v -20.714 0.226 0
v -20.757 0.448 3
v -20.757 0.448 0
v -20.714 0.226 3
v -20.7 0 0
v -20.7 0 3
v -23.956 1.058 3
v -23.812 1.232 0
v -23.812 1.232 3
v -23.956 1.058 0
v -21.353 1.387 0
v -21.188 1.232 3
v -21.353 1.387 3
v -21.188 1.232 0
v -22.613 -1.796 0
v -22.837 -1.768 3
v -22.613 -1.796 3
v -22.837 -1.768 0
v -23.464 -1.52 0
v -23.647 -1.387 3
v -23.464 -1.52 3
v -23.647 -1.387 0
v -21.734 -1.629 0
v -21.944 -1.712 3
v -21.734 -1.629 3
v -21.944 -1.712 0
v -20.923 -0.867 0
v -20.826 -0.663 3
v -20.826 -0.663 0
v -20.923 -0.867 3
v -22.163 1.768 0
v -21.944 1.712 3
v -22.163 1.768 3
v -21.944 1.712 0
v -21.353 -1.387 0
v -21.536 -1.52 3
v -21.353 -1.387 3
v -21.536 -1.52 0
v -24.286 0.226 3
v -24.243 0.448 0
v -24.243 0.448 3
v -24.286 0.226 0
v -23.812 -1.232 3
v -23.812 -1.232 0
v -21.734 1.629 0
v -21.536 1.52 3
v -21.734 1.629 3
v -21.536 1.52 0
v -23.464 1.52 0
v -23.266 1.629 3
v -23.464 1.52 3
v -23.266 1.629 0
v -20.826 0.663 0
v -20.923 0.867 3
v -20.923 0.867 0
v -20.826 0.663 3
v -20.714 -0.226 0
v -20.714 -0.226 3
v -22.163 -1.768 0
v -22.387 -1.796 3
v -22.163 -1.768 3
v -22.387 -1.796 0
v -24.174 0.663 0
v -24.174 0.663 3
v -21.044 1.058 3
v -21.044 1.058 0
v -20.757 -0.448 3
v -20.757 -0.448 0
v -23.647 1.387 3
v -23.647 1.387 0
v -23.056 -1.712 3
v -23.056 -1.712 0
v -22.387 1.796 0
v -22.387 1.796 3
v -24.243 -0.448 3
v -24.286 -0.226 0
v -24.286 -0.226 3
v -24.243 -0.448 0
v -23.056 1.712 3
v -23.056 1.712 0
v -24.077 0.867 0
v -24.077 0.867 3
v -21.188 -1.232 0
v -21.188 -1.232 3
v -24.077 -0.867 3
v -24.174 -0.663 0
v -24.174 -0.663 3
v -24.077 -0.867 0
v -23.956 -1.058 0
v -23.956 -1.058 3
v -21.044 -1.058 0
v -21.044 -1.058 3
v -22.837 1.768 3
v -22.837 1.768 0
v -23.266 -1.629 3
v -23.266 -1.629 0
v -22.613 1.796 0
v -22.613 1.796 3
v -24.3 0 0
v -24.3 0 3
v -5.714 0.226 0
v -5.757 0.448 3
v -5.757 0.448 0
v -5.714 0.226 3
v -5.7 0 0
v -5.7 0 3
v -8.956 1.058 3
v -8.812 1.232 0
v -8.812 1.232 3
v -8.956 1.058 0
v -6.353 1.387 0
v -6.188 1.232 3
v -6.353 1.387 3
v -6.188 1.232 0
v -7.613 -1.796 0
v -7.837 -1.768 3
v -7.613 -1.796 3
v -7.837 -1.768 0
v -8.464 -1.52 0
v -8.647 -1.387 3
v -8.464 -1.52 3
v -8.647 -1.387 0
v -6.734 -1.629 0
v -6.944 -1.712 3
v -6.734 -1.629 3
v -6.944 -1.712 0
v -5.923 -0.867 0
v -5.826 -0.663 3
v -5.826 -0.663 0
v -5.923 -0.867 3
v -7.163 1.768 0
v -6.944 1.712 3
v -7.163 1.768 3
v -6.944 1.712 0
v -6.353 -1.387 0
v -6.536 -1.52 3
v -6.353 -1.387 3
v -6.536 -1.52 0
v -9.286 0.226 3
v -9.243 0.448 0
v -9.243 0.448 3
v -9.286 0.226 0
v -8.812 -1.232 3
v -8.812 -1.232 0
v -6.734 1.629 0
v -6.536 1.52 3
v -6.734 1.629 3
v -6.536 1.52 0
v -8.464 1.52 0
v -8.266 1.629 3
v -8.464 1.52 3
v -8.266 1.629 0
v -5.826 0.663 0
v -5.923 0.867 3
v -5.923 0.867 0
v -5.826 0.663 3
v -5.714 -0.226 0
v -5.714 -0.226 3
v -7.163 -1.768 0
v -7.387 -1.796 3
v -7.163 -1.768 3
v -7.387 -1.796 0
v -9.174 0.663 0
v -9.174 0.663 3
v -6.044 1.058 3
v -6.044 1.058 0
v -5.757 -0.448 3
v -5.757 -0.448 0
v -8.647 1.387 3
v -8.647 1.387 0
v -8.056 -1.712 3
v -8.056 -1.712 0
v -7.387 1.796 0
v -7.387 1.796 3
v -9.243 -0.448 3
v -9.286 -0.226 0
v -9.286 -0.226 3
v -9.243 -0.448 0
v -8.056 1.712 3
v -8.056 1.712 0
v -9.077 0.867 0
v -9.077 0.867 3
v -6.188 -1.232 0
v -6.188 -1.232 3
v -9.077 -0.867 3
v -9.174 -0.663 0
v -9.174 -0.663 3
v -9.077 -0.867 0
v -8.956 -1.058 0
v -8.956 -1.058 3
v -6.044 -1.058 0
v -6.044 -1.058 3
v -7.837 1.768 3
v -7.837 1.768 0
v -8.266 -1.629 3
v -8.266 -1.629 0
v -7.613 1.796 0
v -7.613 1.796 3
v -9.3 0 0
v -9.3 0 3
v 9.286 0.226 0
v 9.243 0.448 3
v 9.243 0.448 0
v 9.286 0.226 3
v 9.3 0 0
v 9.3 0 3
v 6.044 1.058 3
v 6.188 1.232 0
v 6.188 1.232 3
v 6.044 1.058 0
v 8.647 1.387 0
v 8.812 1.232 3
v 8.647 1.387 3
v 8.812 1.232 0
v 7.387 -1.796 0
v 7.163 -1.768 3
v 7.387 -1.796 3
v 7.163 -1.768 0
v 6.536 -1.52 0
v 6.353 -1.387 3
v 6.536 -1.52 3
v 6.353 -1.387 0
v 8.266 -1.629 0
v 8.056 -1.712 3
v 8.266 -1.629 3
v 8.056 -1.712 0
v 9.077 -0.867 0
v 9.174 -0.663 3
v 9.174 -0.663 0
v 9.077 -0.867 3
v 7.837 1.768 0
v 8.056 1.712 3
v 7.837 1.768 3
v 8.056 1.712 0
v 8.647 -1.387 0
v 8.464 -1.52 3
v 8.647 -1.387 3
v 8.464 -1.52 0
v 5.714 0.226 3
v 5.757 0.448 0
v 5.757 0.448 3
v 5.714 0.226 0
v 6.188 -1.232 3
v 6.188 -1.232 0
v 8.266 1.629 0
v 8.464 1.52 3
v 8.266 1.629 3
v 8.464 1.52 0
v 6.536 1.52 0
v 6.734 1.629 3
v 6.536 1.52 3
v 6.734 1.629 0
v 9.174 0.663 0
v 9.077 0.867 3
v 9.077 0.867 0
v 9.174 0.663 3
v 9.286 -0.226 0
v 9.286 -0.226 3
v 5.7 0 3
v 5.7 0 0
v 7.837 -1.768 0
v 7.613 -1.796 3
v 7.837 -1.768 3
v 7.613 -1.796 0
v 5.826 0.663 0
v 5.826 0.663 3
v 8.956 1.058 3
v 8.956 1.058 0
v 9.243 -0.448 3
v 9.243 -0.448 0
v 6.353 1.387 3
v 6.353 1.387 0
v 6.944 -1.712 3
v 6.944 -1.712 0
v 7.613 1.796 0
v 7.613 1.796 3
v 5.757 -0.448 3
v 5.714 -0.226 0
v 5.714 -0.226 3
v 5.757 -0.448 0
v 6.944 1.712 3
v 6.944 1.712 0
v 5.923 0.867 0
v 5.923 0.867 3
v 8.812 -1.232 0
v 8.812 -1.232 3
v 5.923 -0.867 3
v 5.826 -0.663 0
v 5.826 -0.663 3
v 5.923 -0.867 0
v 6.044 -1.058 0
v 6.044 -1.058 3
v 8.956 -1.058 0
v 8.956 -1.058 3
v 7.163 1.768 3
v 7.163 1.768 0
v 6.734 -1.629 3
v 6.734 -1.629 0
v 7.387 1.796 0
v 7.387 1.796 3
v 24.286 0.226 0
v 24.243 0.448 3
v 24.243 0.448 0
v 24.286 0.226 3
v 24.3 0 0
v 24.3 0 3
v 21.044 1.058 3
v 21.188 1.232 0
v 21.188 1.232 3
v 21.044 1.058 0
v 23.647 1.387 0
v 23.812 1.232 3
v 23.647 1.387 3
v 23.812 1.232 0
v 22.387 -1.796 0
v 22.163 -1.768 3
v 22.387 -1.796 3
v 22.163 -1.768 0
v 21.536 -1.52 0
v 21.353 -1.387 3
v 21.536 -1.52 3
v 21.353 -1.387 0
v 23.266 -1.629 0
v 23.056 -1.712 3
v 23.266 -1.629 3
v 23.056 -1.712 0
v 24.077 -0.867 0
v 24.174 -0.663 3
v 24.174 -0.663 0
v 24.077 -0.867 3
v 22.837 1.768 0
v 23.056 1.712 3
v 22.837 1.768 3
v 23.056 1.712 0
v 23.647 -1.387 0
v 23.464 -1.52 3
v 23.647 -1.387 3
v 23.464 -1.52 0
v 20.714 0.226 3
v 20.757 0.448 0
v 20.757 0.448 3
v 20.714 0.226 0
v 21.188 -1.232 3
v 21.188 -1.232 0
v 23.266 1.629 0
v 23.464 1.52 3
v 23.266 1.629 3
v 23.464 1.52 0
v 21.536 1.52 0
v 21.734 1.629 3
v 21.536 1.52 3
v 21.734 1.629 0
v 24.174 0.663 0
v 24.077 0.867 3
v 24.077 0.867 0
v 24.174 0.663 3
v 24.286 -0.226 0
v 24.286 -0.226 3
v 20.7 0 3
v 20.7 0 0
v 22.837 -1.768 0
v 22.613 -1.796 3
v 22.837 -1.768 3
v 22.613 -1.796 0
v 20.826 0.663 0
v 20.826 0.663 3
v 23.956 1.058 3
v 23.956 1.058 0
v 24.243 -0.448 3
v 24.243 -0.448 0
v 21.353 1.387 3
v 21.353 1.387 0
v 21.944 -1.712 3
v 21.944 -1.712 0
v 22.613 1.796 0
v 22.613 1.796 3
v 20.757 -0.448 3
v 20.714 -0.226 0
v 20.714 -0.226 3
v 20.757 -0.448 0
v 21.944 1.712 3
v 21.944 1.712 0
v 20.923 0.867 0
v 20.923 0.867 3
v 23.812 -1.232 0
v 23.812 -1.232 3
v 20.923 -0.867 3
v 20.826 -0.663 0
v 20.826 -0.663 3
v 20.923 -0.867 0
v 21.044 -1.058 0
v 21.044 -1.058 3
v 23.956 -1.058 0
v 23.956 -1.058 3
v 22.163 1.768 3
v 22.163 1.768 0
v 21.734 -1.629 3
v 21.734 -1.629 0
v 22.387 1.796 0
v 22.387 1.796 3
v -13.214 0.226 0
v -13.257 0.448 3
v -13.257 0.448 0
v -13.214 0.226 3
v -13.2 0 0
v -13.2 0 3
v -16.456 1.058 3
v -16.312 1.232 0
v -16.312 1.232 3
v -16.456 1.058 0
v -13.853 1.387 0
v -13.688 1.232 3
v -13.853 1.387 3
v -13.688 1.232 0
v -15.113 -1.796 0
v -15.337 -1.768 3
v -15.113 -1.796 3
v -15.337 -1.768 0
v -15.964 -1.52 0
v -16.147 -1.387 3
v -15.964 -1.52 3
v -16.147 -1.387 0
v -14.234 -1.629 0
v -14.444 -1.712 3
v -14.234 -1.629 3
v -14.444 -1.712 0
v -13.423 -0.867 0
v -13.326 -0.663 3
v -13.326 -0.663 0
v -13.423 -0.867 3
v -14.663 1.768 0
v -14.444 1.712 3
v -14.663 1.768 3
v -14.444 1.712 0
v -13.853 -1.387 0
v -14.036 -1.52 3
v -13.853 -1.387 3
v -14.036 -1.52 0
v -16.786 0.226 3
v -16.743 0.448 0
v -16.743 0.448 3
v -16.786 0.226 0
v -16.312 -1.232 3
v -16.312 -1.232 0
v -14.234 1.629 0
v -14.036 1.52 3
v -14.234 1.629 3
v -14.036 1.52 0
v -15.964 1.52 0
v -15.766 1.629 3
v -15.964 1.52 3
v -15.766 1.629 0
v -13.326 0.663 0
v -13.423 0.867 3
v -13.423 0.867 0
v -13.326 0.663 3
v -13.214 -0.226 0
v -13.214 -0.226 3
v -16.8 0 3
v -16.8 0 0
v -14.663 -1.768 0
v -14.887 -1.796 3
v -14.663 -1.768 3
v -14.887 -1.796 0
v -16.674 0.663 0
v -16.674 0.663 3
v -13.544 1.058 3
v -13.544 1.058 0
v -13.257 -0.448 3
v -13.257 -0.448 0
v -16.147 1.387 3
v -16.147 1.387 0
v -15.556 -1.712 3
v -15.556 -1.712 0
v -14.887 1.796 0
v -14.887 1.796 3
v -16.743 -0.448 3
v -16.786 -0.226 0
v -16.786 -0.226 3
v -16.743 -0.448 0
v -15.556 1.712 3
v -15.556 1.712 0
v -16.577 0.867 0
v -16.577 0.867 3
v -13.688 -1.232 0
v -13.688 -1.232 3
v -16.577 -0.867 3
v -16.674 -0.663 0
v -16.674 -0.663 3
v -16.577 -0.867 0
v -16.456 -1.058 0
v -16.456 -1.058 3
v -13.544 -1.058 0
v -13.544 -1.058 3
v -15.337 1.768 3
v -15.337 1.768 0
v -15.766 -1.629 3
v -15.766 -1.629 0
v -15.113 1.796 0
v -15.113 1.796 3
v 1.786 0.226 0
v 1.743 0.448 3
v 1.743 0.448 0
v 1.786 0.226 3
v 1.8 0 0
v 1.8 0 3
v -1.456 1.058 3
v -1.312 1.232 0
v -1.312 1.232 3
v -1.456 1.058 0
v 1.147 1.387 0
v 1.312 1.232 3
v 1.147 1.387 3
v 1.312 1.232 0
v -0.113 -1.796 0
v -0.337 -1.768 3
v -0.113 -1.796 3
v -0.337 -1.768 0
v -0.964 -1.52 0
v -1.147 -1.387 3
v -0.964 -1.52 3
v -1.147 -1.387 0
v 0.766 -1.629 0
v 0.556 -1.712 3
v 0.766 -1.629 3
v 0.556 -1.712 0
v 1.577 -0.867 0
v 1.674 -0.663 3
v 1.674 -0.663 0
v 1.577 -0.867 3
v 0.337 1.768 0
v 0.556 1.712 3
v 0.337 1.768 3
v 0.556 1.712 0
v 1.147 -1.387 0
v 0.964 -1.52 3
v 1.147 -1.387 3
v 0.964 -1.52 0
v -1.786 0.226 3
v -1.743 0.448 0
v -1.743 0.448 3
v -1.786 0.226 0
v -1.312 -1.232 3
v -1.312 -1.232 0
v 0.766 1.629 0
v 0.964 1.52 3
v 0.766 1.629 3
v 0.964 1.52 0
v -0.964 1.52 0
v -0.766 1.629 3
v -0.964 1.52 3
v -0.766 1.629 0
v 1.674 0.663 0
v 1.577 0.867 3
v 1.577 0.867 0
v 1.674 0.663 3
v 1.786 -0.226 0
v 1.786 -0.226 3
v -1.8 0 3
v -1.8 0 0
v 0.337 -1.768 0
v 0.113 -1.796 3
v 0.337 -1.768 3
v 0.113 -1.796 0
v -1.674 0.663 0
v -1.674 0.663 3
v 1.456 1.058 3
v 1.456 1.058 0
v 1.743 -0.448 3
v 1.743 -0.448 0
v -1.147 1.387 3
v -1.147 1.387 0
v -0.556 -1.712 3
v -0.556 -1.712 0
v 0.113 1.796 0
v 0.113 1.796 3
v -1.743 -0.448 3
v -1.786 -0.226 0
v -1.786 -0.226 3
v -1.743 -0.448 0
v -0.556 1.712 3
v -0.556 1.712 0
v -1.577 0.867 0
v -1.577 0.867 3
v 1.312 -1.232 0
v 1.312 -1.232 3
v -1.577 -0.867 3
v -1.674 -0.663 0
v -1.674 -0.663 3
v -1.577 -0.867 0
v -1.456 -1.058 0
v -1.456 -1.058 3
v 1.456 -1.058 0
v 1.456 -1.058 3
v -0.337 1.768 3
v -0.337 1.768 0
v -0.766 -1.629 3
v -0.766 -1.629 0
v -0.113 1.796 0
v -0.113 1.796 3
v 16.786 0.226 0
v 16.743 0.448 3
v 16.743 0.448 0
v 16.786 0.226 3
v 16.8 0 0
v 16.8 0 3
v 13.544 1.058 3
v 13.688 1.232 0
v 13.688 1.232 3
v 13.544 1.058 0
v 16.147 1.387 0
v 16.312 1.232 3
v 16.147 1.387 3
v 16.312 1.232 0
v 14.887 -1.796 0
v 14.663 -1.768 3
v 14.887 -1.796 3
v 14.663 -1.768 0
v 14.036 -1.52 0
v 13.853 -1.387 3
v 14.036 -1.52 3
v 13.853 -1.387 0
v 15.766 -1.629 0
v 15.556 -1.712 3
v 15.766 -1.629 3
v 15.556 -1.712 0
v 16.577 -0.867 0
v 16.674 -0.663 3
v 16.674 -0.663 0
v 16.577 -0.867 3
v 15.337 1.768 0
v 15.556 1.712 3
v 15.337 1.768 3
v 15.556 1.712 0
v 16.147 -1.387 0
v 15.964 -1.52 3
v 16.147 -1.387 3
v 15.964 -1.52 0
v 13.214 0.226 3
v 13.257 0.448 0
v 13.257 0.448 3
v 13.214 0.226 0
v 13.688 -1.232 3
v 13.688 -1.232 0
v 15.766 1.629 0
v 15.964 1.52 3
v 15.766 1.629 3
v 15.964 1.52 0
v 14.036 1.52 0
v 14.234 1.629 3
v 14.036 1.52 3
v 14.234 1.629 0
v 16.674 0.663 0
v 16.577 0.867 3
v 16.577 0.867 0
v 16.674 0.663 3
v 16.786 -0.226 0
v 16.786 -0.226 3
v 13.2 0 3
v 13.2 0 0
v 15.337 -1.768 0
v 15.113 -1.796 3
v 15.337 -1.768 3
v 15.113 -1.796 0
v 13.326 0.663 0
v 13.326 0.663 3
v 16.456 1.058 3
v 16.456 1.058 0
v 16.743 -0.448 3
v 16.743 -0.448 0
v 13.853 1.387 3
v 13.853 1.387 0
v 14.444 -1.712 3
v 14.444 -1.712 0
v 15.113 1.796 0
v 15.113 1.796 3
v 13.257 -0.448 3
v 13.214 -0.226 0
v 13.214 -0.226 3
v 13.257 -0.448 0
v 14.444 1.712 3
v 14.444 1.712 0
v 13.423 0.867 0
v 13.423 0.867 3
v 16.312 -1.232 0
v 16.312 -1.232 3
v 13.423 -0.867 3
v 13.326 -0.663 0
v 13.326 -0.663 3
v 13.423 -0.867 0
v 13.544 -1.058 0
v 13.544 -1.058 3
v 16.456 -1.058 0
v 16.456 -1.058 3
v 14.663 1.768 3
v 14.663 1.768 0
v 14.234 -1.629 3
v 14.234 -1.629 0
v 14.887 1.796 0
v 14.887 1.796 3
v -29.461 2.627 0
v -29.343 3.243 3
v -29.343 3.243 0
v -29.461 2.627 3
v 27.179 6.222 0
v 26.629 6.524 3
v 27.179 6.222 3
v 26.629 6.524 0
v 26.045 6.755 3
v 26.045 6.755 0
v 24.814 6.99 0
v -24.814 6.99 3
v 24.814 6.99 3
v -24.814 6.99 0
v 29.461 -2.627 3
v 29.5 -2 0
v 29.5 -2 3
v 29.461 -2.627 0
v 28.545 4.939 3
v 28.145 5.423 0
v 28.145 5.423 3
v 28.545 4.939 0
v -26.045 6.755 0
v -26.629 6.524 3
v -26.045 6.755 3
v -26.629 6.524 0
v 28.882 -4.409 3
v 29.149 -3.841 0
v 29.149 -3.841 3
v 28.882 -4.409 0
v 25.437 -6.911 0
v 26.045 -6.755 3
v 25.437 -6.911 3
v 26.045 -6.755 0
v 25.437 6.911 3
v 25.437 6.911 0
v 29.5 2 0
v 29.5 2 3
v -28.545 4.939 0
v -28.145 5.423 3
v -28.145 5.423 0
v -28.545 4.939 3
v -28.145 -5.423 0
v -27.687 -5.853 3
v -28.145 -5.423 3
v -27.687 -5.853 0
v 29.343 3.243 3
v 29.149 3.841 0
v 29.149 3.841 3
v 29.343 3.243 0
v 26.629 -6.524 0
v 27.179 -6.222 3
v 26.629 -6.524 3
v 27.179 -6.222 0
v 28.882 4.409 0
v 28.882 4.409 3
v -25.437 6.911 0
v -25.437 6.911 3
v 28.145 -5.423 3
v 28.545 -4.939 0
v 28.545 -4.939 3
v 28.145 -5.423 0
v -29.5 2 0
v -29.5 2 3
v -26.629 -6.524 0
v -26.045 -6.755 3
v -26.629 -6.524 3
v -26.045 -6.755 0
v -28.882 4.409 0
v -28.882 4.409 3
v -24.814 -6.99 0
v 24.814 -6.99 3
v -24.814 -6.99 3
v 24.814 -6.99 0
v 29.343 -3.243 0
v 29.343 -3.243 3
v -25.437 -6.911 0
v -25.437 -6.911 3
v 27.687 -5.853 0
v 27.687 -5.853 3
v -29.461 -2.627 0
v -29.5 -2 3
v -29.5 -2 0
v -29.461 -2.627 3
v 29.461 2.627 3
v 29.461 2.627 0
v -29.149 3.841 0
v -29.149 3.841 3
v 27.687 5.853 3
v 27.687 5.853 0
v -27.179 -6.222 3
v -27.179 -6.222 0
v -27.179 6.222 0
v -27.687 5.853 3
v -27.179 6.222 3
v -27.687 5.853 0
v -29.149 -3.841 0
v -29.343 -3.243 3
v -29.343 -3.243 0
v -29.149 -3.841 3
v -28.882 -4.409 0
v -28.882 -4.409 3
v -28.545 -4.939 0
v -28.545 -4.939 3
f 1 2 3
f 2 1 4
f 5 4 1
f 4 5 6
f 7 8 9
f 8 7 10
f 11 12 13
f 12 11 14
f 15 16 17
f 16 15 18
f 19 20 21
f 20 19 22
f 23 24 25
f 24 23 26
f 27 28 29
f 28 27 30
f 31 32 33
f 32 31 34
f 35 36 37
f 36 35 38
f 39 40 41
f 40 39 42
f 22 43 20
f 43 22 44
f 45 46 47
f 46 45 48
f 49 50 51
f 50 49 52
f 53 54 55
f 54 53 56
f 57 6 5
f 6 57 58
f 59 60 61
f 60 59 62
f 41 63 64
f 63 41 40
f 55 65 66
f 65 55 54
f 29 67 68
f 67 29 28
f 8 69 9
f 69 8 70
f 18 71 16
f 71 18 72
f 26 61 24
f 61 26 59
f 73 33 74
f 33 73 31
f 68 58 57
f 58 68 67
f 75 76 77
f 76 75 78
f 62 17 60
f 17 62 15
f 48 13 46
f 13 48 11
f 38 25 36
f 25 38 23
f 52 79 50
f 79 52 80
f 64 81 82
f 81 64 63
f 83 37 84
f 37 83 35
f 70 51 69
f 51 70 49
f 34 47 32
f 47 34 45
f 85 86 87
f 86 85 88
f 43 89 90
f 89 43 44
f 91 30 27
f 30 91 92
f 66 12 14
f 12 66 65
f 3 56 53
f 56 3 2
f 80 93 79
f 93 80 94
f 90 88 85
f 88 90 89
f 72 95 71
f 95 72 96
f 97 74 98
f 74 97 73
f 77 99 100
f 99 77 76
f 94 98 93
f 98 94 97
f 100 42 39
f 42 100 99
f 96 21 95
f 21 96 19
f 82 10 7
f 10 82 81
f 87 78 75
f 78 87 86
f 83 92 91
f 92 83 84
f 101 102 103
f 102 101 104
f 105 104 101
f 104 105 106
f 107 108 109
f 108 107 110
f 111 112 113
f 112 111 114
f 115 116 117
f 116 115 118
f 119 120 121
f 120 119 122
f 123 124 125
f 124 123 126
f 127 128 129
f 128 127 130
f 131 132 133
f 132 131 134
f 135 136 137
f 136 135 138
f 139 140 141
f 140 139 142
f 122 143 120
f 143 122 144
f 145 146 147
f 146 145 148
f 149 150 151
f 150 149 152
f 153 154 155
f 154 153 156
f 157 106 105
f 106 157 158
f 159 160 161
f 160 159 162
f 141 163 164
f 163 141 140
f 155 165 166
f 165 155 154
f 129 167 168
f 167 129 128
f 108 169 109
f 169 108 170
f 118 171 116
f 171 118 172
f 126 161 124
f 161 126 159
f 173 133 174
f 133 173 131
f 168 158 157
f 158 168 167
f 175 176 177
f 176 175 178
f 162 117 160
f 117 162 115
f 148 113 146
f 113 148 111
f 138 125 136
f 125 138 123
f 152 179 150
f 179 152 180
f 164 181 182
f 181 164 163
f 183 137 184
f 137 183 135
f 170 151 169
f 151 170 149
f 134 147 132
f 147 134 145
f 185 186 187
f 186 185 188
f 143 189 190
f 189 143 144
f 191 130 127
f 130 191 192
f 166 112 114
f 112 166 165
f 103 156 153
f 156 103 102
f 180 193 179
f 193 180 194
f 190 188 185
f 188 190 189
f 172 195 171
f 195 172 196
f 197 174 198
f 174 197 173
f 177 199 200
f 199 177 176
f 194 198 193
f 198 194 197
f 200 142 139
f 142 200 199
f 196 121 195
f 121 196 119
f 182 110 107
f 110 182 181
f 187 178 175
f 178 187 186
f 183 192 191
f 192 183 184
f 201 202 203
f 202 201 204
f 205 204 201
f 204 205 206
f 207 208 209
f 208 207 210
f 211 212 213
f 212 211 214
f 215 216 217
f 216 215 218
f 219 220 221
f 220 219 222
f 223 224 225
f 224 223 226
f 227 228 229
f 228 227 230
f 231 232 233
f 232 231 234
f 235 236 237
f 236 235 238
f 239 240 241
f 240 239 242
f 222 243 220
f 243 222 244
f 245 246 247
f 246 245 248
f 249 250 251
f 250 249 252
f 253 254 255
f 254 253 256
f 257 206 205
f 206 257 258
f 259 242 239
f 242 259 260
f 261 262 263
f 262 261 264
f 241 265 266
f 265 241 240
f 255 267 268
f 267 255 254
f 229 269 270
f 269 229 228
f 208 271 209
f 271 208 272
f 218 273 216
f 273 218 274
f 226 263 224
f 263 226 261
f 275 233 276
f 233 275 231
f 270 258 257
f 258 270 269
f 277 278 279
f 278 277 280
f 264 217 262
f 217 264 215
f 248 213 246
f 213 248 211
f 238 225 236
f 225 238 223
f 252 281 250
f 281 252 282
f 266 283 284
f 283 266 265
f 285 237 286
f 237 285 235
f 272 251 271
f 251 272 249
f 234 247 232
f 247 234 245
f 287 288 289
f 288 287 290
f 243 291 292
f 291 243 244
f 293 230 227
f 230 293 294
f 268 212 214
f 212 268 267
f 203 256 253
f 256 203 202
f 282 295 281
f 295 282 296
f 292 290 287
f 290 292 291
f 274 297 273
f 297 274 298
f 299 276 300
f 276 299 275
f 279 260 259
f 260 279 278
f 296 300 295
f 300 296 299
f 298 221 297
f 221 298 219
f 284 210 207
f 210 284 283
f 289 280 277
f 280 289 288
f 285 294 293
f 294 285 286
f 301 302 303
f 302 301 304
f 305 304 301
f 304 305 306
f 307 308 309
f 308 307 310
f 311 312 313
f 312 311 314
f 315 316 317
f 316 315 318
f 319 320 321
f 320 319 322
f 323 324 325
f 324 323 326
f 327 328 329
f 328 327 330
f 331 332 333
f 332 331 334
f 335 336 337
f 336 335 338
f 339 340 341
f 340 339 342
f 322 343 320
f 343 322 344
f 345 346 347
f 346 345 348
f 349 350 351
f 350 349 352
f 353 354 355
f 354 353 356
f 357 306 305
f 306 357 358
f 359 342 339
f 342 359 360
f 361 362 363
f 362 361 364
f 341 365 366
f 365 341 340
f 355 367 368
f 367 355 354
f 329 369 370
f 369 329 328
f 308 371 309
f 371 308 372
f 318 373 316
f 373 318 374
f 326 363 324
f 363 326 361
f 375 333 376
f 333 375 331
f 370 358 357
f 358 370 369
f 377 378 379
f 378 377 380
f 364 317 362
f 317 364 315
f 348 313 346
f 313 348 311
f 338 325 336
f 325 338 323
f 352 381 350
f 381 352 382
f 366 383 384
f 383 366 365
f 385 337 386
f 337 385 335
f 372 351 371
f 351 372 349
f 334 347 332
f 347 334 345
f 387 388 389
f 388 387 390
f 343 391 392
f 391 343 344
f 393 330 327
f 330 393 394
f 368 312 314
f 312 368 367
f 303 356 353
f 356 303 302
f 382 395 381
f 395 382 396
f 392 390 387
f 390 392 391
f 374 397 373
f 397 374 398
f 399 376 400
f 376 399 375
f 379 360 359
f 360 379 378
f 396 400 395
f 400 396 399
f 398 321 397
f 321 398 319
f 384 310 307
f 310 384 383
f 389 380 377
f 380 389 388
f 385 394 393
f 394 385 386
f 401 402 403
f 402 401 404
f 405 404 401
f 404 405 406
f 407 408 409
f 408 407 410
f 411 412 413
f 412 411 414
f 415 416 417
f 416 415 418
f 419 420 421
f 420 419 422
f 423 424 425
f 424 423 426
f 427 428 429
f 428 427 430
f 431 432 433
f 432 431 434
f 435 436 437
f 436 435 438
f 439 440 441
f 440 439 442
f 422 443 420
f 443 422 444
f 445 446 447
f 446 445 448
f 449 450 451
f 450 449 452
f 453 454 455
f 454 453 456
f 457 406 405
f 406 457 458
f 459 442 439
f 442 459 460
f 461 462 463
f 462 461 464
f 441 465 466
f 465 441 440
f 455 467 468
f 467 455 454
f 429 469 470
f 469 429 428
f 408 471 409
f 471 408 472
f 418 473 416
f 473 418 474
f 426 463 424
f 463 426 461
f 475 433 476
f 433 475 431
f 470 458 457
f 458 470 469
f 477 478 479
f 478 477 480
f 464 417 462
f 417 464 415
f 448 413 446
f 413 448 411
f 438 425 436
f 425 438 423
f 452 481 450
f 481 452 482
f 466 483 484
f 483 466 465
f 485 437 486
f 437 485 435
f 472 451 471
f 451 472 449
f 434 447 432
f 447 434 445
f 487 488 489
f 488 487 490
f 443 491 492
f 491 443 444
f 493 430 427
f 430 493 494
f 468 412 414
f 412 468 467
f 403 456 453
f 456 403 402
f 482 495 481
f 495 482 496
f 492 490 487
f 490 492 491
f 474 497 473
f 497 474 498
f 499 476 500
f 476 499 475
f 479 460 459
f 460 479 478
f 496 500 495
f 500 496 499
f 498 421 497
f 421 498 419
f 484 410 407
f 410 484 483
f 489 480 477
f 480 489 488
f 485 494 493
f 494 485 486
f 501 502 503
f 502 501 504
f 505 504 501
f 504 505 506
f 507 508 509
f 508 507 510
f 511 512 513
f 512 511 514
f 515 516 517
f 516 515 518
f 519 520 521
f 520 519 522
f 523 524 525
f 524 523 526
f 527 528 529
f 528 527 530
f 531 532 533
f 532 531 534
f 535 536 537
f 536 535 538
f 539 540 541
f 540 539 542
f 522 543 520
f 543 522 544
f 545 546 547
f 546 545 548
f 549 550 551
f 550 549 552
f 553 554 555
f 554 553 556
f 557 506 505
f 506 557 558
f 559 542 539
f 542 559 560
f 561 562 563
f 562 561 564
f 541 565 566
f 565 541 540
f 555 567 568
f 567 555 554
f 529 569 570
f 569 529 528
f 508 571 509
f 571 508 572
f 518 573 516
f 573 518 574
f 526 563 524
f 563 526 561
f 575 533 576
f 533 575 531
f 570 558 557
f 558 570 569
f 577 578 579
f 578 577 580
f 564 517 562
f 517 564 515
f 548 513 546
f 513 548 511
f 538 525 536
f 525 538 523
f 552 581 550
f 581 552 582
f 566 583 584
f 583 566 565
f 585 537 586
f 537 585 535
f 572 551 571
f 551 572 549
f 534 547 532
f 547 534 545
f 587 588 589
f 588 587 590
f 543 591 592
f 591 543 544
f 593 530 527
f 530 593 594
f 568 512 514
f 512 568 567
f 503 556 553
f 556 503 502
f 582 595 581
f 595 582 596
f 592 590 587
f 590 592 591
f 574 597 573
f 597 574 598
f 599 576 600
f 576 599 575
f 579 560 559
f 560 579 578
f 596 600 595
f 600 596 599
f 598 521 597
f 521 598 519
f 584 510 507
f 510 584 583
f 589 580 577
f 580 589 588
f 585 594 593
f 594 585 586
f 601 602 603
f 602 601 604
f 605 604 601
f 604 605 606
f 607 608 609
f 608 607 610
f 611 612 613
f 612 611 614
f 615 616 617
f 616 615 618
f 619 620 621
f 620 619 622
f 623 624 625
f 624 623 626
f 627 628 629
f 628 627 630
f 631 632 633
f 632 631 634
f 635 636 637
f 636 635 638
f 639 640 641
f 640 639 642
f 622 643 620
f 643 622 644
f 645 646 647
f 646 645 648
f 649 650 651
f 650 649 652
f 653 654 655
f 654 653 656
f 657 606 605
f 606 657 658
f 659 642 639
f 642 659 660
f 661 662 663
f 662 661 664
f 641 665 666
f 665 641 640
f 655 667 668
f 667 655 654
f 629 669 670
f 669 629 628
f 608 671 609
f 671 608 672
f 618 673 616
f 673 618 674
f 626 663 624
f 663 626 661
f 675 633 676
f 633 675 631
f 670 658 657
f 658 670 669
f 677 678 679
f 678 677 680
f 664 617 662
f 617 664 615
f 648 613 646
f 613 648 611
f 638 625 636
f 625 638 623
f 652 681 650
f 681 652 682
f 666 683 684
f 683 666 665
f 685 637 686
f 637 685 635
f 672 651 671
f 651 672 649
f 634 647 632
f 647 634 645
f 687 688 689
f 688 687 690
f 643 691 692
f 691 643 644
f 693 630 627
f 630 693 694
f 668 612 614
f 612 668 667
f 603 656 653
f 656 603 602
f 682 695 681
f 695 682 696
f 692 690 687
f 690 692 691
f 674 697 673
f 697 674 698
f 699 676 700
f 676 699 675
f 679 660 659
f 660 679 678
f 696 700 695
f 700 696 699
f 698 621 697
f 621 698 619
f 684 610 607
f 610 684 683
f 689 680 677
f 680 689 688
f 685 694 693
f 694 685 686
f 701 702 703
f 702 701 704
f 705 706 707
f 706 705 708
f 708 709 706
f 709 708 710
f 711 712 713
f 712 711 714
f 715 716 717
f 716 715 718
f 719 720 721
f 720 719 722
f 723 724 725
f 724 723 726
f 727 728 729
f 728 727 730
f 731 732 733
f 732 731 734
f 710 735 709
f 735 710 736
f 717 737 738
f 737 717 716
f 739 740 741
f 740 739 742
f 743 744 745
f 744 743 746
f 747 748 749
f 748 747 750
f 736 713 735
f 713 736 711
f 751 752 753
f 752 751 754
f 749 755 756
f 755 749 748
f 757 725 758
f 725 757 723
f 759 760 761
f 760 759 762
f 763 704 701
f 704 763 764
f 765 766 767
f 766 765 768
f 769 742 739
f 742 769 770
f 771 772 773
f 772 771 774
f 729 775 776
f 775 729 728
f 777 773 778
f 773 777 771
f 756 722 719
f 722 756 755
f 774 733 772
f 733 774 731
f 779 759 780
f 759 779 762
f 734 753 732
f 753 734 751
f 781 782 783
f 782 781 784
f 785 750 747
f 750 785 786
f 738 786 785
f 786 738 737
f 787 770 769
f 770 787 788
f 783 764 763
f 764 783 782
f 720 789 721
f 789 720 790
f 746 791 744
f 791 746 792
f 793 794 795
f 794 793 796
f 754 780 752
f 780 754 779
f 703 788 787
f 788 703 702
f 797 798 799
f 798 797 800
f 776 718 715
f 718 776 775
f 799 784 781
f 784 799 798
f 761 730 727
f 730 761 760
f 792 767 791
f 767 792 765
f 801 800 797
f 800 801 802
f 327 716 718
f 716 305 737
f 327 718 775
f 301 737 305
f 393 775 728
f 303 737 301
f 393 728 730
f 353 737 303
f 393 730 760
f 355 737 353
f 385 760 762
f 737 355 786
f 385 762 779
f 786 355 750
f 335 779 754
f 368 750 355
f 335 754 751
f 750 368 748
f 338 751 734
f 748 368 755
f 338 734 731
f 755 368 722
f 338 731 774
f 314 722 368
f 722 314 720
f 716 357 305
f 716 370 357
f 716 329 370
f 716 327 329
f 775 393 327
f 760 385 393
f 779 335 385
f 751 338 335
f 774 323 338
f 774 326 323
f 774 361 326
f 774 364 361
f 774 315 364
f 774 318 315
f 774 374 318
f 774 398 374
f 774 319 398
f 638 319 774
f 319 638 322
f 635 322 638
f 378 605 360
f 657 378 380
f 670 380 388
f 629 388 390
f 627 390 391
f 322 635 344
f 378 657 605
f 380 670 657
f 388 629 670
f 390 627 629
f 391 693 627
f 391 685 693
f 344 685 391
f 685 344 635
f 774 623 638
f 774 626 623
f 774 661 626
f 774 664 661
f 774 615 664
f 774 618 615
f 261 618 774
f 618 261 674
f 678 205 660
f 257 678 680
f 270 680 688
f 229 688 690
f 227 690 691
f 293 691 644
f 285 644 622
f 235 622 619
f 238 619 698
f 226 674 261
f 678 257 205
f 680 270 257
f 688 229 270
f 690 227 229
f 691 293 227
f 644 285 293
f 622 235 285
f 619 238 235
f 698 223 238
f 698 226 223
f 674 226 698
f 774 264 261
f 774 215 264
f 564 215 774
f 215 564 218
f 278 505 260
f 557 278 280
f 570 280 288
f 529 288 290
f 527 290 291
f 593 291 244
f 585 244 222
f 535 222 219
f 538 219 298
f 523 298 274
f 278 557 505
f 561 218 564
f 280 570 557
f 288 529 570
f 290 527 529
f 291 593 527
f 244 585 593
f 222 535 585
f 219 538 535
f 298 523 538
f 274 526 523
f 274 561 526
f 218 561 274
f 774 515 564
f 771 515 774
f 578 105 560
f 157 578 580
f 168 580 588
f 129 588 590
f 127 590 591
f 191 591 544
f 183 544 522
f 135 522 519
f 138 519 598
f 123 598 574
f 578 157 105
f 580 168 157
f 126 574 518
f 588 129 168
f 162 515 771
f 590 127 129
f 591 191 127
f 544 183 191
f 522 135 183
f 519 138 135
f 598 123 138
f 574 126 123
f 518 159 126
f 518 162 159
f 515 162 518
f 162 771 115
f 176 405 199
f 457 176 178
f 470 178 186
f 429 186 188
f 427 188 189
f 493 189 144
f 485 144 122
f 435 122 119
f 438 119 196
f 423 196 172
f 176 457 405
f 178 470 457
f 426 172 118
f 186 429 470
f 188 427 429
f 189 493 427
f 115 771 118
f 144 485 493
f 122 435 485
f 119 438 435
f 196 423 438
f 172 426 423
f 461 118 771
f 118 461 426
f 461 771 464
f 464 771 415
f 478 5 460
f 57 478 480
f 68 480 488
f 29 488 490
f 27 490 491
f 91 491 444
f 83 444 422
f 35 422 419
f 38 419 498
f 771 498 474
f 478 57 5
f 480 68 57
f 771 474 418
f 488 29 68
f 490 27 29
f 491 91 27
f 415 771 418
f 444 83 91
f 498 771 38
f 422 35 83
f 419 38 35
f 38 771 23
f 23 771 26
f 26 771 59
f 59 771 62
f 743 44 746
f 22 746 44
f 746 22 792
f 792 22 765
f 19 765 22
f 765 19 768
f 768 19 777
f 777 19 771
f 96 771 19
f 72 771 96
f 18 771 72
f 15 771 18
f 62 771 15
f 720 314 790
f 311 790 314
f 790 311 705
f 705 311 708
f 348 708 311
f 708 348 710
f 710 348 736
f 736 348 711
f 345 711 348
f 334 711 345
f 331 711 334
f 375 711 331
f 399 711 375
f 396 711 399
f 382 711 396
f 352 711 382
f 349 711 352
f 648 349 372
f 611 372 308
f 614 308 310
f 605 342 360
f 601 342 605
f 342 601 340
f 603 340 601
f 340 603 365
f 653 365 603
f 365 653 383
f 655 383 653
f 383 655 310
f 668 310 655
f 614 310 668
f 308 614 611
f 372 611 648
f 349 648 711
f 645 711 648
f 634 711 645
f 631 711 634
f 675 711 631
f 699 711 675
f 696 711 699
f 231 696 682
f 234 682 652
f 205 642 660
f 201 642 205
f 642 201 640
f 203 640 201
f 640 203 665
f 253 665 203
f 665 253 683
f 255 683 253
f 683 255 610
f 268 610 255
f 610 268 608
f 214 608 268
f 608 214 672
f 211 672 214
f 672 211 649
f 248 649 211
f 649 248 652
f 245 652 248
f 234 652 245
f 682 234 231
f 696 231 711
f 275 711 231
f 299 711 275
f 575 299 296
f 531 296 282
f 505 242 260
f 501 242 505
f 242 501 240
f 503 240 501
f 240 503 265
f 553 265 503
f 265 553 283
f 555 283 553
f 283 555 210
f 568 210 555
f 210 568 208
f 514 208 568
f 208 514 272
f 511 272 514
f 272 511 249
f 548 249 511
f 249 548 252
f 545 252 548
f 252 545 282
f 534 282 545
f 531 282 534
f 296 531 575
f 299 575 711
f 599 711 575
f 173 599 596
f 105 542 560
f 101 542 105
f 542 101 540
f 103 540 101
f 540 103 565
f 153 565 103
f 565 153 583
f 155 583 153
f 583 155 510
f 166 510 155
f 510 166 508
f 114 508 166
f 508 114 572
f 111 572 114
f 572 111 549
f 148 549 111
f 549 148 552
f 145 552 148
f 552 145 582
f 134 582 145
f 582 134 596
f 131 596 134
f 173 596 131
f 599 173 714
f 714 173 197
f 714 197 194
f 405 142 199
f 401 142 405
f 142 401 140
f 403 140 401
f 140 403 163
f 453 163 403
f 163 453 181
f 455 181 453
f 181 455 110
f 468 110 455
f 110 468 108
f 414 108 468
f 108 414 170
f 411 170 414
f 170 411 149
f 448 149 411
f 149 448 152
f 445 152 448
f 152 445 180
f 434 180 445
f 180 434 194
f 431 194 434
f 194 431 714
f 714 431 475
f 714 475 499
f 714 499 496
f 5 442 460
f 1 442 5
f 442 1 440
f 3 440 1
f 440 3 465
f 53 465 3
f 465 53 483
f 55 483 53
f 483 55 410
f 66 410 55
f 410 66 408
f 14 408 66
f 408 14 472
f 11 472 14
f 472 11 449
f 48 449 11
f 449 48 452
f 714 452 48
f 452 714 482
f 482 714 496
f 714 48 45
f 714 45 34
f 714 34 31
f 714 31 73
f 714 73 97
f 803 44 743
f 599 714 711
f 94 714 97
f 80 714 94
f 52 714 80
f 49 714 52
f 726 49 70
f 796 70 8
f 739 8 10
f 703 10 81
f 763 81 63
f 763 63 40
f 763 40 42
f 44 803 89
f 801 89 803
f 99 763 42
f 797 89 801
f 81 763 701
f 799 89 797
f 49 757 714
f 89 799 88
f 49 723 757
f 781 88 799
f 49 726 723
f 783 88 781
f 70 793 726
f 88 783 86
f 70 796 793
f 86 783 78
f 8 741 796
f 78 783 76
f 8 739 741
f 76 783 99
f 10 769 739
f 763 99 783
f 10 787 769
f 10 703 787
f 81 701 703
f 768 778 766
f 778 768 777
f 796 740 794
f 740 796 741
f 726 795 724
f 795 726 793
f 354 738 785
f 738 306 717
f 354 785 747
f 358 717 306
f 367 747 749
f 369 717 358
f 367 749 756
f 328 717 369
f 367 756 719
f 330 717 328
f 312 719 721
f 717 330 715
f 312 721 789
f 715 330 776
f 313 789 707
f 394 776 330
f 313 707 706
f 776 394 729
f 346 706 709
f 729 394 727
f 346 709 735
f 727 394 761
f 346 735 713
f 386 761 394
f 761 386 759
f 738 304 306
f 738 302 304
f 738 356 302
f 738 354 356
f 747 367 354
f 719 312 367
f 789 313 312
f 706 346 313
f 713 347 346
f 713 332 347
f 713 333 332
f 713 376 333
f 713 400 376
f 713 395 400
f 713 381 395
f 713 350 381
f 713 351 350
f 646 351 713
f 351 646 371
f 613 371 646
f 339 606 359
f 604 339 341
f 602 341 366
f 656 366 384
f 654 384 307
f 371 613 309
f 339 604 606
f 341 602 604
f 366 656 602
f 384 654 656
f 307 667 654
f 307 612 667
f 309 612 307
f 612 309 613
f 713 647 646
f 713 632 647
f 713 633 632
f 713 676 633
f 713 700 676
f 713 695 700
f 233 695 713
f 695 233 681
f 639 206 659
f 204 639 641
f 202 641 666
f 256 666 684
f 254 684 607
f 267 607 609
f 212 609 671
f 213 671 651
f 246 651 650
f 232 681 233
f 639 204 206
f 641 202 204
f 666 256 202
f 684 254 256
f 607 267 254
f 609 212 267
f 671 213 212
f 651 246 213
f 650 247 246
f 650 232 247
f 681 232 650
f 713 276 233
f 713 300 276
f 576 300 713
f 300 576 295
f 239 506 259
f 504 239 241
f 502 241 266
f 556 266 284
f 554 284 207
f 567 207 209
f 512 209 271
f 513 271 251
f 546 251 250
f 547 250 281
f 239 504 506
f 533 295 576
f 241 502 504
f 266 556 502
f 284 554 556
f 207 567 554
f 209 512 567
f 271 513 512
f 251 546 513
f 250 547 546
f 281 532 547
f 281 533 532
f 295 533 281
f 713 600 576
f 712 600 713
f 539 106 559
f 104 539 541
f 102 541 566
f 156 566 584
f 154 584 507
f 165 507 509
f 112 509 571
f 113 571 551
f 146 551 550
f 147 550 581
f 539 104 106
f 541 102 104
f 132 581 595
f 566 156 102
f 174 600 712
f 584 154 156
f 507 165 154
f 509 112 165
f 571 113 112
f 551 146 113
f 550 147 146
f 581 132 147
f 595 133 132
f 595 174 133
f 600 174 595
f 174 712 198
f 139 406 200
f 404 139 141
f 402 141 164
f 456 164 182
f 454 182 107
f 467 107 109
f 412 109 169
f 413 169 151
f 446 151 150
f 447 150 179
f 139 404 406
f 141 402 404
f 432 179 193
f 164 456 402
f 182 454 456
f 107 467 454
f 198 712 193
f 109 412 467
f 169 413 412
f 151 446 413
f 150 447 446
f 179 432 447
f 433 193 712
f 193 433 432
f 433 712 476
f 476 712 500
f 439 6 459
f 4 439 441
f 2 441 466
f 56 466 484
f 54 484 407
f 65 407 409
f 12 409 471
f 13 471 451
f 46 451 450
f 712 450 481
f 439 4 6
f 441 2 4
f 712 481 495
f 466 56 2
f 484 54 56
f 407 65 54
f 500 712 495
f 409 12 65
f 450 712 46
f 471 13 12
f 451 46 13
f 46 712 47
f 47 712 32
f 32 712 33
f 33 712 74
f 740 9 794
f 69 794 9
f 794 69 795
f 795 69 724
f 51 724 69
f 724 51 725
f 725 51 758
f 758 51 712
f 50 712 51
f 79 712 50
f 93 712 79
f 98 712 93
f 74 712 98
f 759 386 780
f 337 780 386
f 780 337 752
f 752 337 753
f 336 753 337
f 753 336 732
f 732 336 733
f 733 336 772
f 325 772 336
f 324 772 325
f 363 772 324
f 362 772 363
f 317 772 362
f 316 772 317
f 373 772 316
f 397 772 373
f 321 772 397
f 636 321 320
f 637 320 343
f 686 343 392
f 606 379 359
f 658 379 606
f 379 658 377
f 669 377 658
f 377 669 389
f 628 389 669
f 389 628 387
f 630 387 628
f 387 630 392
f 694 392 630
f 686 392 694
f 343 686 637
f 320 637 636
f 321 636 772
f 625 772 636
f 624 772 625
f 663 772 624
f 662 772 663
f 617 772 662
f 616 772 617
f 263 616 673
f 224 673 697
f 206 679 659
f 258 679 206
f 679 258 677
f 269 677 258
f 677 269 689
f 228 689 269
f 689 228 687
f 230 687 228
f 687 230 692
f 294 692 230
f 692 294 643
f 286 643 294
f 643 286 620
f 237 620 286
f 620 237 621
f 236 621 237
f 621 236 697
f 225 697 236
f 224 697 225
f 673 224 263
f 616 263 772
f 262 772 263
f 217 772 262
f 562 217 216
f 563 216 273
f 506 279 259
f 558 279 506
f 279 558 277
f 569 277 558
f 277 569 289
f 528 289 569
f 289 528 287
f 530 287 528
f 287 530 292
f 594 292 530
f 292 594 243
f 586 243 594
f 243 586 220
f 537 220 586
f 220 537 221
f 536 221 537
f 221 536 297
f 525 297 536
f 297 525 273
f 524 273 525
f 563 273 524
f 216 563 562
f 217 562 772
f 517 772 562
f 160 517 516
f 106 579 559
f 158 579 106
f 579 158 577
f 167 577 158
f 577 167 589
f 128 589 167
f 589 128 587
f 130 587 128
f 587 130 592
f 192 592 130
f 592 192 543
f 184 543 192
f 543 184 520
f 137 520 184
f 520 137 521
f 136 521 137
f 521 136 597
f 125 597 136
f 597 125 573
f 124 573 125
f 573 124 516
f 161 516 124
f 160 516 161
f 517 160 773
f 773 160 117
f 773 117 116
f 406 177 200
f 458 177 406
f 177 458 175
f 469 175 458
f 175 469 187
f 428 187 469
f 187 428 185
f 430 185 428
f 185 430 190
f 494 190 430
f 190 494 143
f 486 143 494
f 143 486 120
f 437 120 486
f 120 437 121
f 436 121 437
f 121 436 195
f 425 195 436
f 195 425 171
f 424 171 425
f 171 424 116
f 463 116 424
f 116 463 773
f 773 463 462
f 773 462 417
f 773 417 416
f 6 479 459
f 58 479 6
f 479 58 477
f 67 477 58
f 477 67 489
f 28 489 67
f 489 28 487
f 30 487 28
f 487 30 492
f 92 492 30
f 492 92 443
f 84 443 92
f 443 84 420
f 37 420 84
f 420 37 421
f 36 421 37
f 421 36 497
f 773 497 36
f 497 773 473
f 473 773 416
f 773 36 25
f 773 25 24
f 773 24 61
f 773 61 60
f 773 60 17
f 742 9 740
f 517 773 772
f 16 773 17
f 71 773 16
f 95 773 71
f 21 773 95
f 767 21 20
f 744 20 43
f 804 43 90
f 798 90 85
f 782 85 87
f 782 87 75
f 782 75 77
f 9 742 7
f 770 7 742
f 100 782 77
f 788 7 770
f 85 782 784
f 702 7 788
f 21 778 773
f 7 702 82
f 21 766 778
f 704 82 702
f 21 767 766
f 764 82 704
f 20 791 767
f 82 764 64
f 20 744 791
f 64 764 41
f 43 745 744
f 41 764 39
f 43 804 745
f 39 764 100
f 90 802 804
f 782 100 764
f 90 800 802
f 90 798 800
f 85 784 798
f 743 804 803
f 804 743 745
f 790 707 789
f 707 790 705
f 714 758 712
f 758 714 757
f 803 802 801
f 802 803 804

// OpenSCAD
$fn = 50;


difference() {
	union() {
		hull() {
			translate(v = [-24.5000000000, 2.0000000000, 0]) {
				cylinder(h = 3, r = 5);
			}
			translate(v = [24.5000000000, 2.0000000000, 0]) {
				cylinder(h = 3, r = 5);
			}
			translate(v = [-24.5000000000, -2.0000000000, 0]) {
				cylinder(h = 3, r = 5);
			}
			translate(v = [24.5000000000, -2.0000000000, 0]) {
				cylinder(h = 3, r = 5);
			}
		}
	}
	union() {
		translate(v = [-22.5000000000, 0.0000000000, 0]) {
			translate(v = [0, 0, -100]) {
				cylinder(h = 200, r = 1.8000000000);
			}
		}
		translate(v = [-7.5000000000, 0.0000000000, 0]) {
			translate(v = [0, 0, -100]) {
				cylinder(h = 200, r = 1.8000000000);
			}
		}
		translate(v = [7.5000000000, 0.0000000000, 0]) {
			translate(v = [0, 0, -100]) {
				cylinder(h = 200, r = 1.8000000000);
			}
		}
		translate(v = [22.5000000000, 0.0000000000, 0]) {
			translate(v = [0, 0, -100]) {
				cylinder(h = 200, r = 1.8000000000);
			}
		}
		translate(v = [-22.5000000000, 0.0000000000, 0]) {
			translate(v = [0, 0, -100]) {
				cylinder(h = 200, r = 1.8000000000);
			}
		}
		translate(v = [-15.0000000000, 0.0000000000, 0]) {
			translate(v = [0, 0, -100]) {
				cylinder(h = 200, r = 1.8000000000);
			}
		}
		translate(v = [-7.5000000000, 0.0000000000, 0]) {
			translate(v = [0, 0, -100]) {
				cylinder(h = 200, r = 1.8000000000);
			}
		}
		translate(v = [0, 0, -100]) {
			cylinder(h = 200, r = 1.8000000000);
		}
		translate(v = [7.5000000000, 0.0000000000, 0]) {
			translate(v = [0, 0, -100]) {
				cylinder(h = 200, r = 1.8000000000);
			}
		}
		translate(v = [15.0000000000, 0.0000000000, 0]) {
			translate(v = [0, 0, -100]) {
				cylinder(h = 200, r = 1.8000000000);
			}
		}
		translate(v = [22.5000000000, 0.0000000000, 0]) {
			translate(v = [0, 0, -100]) {
				cylinder(h = 200, r = 1.8000000000);
			}
		}
	}
}
